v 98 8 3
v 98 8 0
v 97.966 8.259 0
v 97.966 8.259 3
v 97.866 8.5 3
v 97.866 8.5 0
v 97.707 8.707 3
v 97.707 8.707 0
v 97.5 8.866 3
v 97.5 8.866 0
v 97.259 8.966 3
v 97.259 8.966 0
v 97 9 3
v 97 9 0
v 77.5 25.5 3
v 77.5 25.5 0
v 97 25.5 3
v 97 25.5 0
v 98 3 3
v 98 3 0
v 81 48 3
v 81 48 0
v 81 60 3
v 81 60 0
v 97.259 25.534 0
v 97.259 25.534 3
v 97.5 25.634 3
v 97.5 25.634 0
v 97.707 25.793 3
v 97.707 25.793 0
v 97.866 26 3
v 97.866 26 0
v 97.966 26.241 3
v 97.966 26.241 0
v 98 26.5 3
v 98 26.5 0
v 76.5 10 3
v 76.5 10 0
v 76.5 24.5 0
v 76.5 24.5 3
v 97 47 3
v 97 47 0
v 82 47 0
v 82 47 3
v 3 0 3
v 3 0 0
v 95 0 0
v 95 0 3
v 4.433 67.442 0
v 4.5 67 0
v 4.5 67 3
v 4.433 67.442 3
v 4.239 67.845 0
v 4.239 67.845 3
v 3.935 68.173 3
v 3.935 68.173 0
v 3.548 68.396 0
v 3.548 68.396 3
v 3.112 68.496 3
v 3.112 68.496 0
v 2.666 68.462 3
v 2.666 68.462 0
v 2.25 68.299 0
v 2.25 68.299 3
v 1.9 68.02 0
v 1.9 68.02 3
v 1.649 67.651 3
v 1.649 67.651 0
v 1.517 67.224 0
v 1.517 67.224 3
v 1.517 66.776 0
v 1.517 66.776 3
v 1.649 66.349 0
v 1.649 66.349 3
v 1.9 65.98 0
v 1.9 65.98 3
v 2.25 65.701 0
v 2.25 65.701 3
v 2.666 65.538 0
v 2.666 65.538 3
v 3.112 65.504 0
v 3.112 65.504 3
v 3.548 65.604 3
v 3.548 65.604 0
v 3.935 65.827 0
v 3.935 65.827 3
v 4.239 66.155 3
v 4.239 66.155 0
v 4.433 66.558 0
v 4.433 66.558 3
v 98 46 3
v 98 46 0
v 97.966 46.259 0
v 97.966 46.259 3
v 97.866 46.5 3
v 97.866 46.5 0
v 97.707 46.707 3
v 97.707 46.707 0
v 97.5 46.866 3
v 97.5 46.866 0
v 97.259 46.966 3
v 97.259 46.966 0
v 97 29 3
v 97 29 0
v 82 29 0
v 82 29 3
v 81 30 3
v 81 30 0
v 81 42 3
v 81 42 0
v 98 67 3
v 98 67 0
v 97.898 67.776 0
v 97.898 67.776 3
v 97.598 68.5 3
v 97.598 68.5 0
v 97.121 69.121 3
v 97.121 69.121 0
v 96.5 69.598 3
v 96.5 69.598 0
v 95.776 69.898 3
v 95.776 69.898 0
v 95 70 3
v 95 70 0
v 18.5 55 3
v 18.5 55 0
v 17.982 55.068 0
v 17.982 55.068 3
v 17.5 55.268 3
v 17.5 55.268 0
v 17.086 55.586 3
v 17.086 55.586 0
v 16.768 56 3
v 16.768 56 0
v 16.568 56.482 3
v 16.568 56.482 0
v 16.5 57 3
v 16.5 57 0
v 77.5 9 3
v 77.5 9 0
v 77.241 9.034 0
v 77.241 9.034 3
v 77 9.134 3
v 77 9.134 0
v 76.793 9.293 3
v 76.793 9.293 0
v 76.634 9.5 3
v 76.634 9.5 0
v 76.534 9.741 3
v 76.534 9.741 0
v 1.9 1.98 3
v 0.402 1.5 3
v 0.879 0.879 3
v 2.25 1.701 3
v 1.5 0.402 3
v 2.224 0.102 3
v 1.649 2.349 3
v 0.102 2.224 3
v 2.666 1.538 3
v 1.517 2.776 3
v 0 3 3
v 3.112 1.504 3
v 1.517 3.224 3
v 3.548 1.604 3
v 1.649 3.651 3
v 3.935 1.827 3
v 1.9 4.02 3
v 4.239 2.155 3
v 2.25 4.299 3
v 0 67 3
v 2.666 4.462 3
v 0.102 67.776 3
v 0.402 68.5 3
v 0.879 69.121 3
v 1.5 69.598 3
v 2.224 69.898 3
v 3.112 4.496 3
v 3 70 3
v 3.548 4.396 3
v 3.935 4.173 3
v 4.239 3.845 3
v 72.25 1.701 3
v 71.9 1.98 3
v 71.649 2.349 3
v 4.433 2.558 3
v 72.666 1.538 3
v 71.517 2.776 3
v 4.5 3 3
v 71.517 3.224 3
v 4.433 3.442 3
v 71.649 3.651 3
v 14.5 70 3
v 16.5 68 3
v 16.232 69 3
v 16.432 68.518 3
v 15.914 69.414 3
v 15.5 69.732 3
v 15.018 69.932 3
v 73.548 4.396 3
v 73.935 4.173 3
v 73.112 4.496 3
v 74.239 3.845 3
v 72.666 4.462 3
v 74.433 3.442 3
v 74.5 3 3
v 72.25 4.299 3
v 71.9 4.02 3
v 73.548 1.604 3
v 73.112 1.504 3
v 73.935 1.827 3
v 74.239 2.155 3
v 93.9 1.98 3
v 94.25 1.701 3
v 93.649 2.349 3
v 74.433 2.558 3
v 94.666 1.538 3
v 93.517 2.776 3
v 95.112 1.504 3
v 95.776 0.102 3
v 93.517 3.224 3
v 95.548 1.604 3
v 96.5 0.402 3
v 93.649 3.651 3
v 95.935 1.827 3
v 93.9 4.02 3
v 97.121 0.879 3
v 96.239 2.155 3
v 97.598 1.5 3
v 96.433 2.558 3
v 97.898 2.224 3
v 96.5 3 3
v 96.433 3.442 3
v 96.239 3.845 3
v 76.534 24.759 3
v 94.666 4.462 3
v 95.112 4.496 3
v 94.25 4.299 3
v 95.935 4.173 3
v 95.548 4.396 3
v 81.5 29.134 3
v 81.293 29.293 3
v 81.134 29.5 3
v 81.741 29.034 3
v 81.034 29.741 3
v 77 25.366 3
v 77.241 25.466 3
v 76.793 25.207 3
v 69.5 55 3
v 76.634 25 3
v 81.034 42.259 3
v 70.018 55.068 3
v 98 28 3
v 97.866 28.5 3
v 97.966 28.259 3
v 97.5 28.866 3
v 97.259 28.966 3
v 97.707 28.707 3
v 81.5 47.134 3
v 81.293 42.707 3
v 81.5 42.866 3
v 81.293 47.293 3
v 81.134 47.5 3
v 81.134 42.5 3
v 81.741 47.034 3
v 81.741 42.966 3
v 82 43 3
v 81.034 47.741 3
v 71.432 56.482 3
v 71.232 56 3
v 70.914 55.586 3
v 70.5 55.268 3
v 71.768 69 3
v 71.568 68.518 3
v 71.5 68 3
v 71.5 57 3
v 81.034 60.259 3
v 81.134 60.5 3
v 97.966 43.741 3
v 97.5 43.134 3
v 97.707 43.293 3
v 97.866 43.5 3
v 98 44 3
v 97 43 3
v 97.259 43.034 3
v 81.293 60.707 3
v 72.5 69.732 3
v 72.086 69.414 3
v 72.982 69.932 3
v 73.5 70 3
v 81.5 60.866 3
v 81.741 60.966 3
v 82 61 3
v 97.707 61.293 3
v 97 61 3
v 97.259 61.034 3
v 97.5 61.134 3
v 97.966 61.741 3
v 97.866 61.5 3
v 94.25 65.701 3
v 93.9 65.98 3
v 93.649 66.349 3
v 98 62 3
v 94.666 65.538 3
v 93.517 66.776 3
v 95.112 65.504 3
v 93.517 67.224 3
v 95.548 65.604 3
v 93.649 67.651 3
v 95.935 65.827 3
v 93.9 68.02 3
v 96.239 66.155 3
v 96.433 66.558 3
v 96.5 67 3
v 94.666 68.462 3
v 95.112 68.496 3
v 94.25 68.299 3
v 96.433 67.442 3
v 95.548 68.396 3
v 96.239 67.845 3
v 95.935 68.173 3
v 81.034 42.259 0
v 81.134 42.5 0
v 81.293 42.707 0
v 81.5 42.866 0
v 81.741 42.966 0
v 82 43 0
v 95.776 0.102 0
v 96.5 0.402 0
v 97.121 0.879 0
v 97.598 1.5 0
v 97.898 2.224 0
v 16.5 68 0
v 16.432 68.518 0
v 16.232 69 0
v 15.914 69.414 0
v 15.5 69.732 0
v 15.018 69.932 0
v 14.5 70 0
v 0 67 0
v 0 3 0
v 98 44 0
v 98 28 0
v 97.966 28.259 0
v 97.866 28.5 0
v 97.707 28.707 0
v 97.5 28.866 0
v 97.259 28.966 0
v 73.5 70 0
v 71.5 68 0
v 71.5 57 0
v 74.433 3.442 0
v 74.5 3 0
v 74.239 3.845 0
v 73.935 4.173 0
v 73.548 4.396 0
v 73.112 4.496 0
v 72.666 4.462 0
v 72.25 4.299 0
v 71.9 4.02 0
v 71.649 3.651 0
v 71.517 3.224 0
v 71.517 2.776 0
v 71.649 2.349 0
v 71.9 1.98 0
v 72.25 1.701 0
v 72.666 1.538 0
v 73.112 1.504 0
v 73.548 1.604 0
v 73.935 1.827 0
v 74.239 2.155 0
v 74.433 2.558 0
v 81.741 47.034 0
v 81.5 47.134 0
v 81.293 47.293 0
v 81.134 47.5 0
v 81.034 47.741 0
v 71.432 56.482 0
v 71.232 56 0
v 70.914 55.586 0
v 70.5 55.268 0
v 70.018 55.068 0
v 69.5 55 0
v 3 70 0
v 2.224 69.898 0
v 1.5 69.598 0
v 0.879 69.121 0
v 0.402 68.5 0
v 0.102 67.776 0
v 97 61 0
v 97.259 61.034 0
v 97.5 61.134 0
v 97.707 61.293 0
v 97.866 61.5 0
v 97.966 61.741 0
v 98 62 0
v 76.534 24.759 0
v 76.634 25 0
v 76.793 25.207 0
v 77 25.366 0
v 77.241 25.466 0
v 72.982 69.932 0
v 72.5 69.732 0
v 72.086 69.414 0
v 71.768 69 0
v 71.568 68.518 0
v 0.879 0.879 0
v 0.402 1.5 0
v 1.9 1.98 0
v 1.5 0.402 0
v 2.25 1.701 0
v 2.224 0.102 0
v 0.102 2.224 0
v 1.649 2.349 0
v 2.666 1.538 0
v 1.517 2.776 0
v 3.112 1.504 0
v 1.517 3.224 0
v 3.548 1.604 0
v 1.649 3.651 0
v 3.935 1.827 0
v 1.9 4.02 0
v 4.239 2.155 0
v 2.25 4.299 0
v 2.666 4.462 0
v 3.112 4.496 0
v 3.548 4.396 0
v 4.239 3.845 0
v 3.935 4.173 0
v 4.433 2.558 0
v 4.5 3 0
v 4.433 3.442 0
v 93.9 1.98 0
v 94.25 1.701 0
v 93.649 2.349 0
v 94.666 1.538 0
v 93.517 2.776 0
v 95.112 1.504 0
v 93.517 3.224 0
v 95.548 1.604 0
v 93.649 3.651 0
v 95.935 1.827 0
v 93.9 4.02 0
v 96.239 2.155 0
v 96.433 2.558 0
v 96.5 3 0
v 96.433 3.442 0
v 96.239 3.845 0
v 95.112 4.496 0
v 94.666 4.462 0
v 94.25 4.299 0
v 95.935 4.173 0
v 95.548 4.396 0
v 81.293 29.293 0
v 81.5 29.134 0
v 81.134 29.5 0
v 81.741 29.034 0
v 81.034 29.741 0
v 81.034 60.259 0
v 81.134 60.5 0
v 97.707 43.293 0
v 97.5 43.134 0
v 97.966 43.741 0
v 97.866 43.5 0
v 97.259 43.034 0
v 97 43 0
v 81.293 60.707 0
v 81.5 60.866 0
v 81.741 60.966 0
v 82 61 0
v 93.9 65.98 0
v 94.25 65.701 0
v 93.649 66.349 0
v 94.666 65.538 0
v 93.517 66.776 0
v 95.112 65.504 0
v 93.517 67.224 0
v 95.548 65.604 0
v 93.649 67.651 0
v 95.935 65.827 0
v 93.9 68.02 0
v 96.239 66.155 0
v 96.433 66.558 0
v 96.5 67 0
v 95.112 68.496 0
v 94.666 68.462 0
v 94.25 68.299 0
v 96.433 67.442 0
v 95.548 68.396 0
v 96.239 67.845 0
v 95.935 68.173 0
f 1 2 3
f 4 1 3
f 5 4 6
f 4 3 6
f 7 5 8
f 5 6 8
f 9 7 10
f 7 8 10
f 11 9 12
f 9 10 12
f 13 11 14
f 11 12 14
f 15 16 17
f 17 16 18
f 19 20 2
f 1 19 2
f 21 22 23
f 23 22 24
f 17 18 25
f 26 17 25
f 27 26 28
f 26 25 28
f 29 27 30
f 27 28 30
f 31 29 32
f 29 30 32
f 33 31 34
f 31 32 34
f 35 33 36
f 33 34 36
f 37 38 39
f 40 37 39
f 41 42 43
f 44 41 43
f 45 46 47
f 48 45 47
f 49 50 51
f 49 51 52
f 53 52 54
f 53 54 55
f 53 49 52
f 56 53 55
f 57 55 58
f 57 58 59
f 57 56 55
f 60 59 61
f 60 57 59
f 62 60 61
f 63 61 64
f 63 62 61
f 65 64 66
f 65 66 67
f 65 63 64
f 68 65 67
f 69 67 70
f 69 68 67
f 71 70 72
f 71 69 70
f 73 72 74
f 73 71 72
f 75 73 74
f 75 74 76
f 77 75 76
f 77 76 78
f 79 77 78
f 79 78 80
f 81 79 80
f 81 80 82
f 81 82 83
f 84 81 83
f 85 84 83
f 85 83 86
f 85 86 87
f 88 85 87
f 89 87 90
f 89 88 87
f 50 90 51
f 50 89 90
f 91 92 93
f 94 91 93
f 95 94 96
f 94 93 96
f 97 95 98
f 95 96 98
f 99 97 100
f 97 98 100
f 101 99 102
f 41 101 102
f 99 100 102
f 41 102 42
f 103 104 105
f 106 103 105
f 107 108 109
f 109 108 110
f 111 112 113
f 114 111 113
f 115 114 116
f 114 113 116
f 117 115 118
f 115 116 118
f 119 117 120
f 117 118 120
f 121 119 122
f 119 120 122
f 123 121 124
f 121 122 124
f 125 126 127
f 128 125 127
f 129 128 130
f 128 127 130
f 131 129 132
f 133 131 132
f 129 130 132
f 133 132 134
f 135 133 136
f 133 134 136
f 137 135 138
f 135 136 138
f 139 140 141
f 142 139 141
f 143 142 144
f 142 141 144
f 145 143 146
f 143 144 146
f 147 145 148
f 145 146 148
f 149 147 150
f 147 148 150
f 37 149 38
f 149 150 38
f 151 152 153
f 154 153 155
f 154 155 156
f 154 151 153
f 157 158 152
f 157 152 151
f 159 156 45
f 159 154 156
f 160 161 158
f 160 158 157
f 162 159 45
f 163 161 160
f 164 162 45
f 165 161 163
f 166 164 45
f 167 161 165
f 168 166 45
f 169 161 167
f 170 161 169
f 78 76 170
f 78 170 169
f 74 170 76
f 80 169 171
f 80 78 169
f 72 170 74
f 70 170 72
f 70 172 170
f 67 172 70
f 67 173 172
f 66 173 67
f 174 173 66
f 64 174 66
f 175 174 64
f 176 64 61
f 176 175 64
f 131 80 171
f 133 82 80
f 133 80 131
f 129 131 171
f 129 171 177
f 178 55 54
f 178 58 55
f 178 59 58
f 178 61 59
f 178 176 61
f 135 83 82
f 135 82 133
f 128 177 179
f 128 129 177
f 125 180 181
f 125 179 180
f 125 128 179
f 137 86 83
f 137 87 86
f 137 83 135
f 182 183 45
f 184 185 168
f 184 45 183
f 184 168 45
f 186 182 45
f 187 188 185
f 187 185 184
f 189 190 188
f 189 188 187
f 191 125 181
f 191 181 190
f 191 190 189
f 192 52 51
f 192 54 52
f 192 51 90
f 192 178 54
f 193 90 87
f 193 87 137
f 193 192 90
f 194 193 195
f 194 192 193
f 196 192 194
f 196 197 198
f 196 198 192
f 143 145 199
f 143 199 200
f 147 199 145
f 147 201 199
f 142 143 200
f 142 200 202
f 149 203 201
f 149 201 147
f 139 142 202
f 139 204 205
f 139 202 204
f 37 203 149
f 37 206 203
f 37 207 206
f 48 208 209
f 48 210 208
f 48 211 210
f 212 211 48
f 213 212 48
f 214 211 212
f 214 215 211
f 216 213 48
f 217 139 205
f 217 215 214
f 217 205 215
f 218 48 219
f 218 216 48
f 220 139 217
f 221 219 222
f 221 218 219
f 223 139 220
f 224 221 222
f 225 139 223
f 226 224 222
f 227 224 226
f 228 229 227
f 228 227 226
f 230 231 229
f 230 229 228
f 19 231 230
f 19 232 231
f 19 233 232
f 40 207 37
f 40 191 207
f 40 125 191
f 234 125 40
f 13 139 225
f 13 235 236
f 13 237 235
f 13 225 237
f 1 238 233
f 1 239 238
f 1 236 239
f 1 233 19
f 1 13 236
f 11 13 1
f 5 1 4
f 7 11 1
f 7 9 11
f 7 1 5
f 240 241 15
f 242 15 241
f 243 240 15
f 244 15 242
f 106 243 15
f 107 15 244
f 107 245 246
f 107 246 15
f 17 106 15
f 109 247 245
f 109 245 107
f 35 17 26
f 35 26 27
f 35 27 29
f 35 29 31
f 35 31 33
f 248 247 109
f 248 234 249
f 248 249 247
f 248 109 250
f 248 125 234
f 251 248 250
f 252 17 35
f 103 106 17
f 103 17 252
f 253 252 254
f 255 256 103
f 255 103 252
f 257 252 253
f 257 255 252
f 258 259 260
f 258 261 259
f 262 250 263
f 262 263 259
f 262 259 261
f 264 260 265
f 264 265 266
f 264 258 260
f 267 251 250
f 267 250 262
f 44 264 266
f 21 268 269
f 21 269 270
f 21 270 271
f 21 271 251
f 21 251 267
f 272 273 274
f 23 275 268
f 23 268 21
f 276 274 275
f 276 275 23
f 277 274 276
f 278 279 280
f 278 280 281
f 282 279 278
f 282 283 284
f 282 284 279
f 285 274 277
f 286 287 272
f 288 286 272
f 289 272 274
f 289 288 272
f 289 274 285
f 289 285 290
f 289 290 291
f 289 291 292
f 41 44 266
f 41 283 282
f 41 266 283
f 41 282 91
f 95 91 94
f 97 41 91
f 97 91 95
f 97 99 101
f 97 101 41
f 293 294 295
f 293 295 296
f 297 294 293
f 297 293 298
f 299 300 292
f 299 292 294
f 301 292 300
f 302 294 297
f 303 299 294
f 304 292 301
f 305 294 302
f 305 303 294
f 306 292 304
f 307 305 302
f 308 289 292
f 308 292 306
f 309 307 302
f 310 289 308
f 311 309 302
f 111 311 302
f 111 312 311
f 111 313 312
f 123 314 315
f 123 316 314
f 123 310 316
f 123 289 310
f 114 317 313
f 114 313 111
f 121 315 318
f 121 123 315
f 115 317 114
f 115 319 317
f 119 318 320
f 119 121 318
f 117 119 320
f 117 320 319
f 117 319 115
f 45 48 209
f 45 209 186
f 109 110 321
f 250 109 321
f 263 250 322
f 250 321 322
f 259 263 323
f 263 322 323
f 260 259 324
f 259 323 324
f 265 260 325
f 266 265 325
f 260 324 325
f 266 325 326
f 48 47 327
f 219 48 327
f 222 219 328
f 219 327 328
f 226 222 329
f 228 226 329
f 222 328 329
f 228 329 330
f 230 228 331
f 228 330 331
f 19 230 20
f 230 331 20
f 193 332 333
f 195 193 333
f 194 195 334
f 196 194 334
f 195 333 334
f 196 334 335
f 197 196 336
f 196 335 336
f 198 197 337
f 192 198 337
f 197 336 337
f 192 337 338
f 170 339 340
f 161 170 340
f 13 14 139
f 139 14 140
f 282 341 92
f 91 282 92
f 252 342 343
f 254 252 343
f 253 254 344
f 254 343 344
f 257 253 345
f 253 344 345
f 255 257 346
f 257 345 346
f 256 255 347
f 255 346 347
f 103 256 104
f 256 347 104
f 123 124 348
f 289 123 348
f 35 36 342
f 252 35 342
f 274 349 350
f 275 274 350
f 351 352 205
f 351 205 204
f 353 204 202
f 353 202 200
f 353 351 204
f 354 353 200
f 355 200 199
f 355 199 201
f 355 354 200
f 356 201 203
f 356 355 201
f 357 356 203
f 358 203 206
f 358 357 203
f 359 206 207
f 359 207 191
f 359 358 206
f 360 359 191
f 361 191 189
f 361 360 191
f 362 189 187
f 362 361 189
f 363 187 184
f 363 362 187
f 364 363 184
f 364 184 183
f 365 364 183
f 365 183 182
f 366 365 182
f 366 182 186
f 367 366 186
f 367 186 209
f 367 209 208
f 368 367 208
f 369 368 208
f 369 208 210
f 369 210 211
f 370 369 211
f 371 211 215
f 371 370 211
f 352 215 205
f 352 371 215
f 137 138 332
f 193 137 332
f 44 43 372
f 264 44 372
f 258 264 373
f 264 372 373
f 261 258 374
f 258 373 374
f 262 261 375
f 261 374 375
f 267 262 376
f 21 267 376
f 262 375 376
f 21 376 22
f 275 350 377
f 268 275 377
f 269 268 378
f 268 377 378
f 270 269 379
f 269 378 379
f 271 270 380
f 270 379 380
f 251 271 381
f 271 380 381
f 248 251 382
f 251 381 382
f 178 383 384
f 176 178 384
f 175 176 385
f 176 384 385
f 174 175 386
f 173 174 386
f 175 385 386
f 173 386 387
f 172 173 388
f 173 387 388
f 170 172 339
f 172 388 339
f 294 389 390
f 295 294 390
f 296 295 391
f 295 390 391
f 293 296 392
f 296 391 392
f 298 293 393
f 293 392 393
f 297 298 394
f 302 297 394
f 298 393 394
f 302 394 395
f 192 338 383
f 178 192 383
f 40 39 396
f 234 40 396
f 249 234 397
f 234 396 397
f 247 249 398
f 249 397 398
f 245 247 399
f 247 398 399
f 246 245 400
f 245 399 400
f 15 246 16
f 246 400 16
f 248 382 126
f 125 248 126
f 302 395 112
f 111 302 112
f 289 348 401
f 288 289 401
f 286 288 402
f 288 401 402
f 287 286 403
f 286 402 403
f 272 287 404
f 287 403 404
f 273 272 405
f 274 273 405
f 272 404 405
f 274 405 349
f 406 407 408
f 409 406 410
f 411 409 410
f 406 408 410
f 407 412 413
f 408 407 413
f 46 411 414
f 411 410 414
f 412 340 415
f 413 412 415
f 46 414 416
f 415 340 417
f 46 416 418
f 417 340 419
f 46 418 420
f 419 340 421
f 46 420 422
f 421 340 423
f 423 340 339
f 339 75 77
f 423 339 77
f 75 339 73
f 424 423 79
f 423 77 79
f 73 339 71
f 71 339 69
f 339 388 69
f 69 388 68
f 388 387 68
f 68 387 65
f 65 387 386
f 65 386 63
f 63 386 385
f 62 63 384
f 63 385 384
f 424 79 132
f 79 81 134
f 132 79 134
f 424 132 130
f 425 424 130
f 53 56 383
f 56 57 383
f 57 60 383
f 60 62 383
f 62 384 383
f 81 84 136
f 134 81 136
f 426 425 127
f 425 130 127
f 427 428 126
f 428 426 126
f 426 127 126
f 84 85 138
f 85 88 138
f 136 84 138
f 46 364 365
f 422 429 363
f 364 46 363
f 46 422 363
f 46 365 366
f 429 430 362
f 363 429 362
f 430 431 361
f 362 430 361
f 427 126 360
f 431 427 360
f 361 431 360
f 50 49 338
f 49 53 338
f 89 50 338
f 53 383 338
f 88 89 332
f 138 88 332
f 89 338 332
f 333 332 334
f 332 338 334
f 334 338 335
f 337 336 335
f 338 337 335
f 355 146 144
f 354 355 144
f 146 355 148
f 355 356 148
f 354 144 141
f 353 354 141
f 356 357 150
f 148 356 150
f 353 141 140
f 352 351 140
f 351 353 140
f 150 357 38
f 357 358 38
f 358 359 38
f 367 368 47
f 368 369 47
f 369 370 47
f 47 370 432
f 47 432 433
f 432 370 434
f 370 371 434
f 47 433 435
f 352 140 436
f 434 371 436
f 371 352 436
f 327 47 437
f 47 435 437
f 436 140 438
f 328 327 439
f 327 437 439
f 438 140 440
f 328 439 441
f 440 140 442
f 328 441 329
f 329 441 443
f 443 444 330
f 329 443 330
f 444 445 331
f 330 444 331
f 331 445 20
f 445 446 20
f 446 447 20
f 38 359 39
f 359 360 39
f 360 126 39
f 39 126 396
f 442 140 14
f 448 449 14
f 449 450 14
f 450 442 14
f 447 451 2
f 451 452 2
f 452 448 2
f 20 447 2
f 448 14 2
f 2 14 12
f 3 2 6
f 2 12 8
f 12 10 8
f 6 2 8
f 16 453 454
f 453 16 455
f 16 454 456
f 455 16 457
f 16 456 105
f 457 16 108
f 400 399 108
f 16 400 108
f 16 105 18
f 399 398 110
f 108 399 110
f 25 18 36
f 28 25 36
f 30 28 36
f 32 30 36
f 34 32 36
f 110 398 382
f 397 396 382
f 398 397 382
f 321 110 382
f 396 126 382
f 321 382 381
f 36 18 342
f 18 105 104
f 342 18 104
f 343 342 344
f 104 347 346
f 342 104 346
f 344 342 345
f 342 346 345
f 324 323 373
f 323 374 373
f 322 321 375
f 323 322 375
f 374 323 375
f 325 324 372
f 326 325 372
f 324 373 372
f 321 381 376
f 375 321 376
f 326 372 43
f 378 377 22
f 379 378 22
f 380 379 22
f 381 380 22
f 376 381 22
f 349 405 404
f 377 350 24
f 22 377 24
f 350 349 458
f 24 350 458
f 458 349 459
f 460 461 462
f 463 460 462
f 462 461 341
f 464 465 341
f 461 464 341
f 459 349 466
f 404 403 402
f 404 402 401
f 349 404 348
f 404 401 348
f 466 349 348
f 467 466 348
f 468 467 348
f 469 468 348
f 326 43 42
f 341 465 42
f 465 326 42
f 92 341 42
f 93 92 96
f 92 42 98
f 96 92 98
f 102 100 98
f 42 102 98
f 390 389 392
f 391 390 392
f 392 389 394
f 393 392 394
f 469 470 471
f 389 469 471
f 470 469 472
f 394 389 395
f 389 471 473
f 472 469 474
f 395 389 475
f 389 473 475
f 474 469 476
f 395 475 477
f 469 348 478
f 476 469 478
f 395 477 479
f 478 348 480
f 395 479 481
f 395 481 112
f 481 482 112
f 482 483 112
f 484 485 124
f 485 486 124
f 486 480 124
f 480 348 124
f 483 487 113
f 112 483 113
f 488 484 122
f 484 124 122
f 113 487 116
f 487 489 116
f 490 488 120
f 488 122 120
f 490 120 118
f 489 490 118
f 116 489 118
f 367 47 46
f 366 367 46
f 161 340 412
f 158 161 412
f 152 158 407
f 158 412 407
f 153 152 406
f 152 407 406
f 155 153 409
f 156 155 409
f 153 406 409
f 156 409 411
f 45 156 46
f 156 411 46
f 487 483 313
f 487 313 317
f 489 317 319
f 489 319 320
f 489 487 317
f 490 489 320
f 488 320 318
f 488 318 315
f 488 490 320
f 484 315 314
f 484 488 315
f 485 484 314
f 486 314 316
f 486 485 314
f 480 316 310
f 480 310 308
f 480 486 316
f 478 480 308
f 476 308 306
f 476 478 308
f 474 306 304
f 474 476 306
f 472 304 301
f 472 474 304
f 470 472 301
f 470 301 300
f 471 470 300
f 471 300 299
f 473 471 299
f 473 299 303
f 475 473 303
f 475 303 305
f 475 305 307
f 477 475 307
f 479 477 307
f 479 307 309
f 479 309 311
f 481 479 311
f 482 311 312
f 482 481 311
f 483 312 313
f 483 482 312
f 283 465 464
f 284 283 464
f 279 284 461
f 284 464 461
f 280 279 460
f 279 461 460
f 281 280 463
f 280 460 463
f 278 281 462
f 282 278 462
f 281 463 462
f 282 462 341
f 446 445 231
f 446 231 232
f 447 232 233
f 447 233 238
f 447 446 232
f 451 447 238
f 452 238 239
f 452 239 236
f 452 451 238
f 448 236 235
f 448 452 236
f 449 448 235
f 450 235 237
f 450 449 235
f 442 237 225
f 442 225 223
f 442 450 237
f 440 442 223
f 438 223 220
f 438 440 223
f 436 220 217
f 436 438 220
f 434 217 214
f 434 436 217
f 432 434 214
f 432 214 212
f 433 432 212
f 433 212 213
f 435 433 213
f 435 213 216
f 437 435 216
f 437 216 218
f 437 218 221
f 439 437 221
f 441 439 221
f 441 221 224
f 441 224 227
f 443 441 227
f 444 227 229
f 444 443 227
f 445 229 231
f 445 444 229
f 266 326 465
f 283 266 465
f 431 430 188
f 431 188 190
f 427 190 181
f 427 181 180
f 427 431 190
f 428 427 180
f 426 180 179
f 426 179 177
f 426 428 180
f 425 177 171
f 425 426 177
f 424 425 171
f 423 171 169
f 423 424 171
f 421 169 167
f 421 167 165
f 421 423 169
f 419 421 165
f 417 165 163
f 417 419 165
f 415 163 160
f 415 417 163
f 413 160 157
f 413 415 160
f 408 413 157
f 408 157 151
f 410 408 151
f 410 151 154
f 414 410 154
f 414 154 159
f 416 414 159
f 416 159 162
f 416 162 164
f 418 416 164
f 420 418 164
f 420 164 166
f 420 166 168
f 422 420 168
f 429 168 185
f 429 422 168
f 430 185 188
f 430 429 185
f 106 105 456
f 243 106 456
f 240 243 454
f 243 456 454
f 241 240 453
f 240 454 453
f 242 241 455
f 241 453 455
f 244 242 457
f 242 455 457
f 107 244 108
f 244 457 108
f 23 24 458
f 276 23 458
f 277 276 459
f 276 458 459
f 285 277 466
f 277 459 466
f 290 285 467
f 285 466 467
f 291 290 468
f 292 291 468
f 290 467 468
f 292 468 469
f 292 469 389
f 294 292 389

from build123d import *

# Parameters (mm, degrees)
F0_R     = 1.5
F1_DEPTH = 3


with BuildPart() as f1:
    # F0 (on Top) → F1 (new body)
    with BuildSketch(Plane.XY):
        with BuildLine():
            ThreePointArc((0, 3), (0.87868, 0.87868), (3, 0))
            Line((3, 0), (95, 0))
            ThreePointArc((95, 0), (97.12132, 0.87868), (98, 3))
            Line((98, 3), (98, 8))
            ThreePointArc((98, 8), (97.707107, 8.707107), (97, 9))
            Line((97, 9), (77.5, 9))
            ThreePointArc((77.5, 9), (76.792893, 9.292893), (76.5, 10))
            Line((76.5, 10), (76.5, 24.5))
            ThreePointArc((76.5, 24.5), (76.792893, 25.207107), (77.5, 25.5))
            Line((77.5, 25.5), (97, 25.5))
            ThreePointArc((97, 25.5), (97.707107, 25.792893), (98, 26.5))
            Line((98, 26.5), (98, 28))
            ThreePointArc((98, 28), (97.707107, 28.707107), (97, 29))
            Line((97, 29), (82, 29))
            ThreePointArc((82, 29), (81.292893, 29.292893), (81, 30))
            Line((81, 30), (81, 42))
            ThreePointArc((81, 42), (81.292893, 42.707107), (82, 43))
            Line((82, 43), (97, 43))
            ThreePointArc((97, 43), (97.707107, 43.292893), (98, 44))
            Line((98, 44), (98, 46))
            ThreePointArc((98, 46), (97.707107, 46.707107), (97, 47))
            Line((97, 47), (82, 47))
            ThreePointArc((82, 47), (81.292893, 47.292893), (81, 48))
            Line((81, 48), (81, 60))
            ThreePointArc((81, 60), (81.292893, 60.707107), (82, 61))
            Line((82, 61), (97, 61))
            ThreePointArc((97, 61), (97.707107, 61.292893), (98, 62))
            Line((98, 62), (98, 67))
            ThreePointArc((98, 67), (97.12132, 69.12132), (95, 70))
            Line((95, 70), (73.5, 70))
            ThreePointArc((73.5, 70), (72.085786, 69.414214), (71.5, 68))
            Line((71.5, 68), (71.5, 57))
            ThreePointArc((71.5, 57), (70.914214, 55.585786), (69.5, 55))
            Line((69.5, 55), (18.5, 55))
            ThreePointArc((18.5, 55), (17.085786, 55.585786), (16.5, 57))
            Line((16.5, 57), (16.5, 68))
            ThreePointArc((16.5, 68), (15.914214, 69.414214), (14.5, 70))
            Line((14.5, 70), (3, 70))
            ThreePointArc((3, 70), (0.87868, 69.12132), (0, 67))
            Line((0, 67), (0, 3))
        make_face()
        with Locations((3, 3)):
            Circle(F0_R, mode=Mode.SUBTRACT)
        with Locations((73, 3)):
            Circle(F0_R, mode=Mode.SUBTRACT)
        with Locations((95, 3)):
            Circle(F0_R, mode=Mode.SUBTRACT)
        with Locations((3, 67)):
            Circle(F0_R, mode=Mode.SUBTRACT)
        with Locations((95, 67)):
            Circle(F0_R, mode=Mode.SUBTRACT)
    extrude(amount=F1_DEPTH)


solid = f1.part
